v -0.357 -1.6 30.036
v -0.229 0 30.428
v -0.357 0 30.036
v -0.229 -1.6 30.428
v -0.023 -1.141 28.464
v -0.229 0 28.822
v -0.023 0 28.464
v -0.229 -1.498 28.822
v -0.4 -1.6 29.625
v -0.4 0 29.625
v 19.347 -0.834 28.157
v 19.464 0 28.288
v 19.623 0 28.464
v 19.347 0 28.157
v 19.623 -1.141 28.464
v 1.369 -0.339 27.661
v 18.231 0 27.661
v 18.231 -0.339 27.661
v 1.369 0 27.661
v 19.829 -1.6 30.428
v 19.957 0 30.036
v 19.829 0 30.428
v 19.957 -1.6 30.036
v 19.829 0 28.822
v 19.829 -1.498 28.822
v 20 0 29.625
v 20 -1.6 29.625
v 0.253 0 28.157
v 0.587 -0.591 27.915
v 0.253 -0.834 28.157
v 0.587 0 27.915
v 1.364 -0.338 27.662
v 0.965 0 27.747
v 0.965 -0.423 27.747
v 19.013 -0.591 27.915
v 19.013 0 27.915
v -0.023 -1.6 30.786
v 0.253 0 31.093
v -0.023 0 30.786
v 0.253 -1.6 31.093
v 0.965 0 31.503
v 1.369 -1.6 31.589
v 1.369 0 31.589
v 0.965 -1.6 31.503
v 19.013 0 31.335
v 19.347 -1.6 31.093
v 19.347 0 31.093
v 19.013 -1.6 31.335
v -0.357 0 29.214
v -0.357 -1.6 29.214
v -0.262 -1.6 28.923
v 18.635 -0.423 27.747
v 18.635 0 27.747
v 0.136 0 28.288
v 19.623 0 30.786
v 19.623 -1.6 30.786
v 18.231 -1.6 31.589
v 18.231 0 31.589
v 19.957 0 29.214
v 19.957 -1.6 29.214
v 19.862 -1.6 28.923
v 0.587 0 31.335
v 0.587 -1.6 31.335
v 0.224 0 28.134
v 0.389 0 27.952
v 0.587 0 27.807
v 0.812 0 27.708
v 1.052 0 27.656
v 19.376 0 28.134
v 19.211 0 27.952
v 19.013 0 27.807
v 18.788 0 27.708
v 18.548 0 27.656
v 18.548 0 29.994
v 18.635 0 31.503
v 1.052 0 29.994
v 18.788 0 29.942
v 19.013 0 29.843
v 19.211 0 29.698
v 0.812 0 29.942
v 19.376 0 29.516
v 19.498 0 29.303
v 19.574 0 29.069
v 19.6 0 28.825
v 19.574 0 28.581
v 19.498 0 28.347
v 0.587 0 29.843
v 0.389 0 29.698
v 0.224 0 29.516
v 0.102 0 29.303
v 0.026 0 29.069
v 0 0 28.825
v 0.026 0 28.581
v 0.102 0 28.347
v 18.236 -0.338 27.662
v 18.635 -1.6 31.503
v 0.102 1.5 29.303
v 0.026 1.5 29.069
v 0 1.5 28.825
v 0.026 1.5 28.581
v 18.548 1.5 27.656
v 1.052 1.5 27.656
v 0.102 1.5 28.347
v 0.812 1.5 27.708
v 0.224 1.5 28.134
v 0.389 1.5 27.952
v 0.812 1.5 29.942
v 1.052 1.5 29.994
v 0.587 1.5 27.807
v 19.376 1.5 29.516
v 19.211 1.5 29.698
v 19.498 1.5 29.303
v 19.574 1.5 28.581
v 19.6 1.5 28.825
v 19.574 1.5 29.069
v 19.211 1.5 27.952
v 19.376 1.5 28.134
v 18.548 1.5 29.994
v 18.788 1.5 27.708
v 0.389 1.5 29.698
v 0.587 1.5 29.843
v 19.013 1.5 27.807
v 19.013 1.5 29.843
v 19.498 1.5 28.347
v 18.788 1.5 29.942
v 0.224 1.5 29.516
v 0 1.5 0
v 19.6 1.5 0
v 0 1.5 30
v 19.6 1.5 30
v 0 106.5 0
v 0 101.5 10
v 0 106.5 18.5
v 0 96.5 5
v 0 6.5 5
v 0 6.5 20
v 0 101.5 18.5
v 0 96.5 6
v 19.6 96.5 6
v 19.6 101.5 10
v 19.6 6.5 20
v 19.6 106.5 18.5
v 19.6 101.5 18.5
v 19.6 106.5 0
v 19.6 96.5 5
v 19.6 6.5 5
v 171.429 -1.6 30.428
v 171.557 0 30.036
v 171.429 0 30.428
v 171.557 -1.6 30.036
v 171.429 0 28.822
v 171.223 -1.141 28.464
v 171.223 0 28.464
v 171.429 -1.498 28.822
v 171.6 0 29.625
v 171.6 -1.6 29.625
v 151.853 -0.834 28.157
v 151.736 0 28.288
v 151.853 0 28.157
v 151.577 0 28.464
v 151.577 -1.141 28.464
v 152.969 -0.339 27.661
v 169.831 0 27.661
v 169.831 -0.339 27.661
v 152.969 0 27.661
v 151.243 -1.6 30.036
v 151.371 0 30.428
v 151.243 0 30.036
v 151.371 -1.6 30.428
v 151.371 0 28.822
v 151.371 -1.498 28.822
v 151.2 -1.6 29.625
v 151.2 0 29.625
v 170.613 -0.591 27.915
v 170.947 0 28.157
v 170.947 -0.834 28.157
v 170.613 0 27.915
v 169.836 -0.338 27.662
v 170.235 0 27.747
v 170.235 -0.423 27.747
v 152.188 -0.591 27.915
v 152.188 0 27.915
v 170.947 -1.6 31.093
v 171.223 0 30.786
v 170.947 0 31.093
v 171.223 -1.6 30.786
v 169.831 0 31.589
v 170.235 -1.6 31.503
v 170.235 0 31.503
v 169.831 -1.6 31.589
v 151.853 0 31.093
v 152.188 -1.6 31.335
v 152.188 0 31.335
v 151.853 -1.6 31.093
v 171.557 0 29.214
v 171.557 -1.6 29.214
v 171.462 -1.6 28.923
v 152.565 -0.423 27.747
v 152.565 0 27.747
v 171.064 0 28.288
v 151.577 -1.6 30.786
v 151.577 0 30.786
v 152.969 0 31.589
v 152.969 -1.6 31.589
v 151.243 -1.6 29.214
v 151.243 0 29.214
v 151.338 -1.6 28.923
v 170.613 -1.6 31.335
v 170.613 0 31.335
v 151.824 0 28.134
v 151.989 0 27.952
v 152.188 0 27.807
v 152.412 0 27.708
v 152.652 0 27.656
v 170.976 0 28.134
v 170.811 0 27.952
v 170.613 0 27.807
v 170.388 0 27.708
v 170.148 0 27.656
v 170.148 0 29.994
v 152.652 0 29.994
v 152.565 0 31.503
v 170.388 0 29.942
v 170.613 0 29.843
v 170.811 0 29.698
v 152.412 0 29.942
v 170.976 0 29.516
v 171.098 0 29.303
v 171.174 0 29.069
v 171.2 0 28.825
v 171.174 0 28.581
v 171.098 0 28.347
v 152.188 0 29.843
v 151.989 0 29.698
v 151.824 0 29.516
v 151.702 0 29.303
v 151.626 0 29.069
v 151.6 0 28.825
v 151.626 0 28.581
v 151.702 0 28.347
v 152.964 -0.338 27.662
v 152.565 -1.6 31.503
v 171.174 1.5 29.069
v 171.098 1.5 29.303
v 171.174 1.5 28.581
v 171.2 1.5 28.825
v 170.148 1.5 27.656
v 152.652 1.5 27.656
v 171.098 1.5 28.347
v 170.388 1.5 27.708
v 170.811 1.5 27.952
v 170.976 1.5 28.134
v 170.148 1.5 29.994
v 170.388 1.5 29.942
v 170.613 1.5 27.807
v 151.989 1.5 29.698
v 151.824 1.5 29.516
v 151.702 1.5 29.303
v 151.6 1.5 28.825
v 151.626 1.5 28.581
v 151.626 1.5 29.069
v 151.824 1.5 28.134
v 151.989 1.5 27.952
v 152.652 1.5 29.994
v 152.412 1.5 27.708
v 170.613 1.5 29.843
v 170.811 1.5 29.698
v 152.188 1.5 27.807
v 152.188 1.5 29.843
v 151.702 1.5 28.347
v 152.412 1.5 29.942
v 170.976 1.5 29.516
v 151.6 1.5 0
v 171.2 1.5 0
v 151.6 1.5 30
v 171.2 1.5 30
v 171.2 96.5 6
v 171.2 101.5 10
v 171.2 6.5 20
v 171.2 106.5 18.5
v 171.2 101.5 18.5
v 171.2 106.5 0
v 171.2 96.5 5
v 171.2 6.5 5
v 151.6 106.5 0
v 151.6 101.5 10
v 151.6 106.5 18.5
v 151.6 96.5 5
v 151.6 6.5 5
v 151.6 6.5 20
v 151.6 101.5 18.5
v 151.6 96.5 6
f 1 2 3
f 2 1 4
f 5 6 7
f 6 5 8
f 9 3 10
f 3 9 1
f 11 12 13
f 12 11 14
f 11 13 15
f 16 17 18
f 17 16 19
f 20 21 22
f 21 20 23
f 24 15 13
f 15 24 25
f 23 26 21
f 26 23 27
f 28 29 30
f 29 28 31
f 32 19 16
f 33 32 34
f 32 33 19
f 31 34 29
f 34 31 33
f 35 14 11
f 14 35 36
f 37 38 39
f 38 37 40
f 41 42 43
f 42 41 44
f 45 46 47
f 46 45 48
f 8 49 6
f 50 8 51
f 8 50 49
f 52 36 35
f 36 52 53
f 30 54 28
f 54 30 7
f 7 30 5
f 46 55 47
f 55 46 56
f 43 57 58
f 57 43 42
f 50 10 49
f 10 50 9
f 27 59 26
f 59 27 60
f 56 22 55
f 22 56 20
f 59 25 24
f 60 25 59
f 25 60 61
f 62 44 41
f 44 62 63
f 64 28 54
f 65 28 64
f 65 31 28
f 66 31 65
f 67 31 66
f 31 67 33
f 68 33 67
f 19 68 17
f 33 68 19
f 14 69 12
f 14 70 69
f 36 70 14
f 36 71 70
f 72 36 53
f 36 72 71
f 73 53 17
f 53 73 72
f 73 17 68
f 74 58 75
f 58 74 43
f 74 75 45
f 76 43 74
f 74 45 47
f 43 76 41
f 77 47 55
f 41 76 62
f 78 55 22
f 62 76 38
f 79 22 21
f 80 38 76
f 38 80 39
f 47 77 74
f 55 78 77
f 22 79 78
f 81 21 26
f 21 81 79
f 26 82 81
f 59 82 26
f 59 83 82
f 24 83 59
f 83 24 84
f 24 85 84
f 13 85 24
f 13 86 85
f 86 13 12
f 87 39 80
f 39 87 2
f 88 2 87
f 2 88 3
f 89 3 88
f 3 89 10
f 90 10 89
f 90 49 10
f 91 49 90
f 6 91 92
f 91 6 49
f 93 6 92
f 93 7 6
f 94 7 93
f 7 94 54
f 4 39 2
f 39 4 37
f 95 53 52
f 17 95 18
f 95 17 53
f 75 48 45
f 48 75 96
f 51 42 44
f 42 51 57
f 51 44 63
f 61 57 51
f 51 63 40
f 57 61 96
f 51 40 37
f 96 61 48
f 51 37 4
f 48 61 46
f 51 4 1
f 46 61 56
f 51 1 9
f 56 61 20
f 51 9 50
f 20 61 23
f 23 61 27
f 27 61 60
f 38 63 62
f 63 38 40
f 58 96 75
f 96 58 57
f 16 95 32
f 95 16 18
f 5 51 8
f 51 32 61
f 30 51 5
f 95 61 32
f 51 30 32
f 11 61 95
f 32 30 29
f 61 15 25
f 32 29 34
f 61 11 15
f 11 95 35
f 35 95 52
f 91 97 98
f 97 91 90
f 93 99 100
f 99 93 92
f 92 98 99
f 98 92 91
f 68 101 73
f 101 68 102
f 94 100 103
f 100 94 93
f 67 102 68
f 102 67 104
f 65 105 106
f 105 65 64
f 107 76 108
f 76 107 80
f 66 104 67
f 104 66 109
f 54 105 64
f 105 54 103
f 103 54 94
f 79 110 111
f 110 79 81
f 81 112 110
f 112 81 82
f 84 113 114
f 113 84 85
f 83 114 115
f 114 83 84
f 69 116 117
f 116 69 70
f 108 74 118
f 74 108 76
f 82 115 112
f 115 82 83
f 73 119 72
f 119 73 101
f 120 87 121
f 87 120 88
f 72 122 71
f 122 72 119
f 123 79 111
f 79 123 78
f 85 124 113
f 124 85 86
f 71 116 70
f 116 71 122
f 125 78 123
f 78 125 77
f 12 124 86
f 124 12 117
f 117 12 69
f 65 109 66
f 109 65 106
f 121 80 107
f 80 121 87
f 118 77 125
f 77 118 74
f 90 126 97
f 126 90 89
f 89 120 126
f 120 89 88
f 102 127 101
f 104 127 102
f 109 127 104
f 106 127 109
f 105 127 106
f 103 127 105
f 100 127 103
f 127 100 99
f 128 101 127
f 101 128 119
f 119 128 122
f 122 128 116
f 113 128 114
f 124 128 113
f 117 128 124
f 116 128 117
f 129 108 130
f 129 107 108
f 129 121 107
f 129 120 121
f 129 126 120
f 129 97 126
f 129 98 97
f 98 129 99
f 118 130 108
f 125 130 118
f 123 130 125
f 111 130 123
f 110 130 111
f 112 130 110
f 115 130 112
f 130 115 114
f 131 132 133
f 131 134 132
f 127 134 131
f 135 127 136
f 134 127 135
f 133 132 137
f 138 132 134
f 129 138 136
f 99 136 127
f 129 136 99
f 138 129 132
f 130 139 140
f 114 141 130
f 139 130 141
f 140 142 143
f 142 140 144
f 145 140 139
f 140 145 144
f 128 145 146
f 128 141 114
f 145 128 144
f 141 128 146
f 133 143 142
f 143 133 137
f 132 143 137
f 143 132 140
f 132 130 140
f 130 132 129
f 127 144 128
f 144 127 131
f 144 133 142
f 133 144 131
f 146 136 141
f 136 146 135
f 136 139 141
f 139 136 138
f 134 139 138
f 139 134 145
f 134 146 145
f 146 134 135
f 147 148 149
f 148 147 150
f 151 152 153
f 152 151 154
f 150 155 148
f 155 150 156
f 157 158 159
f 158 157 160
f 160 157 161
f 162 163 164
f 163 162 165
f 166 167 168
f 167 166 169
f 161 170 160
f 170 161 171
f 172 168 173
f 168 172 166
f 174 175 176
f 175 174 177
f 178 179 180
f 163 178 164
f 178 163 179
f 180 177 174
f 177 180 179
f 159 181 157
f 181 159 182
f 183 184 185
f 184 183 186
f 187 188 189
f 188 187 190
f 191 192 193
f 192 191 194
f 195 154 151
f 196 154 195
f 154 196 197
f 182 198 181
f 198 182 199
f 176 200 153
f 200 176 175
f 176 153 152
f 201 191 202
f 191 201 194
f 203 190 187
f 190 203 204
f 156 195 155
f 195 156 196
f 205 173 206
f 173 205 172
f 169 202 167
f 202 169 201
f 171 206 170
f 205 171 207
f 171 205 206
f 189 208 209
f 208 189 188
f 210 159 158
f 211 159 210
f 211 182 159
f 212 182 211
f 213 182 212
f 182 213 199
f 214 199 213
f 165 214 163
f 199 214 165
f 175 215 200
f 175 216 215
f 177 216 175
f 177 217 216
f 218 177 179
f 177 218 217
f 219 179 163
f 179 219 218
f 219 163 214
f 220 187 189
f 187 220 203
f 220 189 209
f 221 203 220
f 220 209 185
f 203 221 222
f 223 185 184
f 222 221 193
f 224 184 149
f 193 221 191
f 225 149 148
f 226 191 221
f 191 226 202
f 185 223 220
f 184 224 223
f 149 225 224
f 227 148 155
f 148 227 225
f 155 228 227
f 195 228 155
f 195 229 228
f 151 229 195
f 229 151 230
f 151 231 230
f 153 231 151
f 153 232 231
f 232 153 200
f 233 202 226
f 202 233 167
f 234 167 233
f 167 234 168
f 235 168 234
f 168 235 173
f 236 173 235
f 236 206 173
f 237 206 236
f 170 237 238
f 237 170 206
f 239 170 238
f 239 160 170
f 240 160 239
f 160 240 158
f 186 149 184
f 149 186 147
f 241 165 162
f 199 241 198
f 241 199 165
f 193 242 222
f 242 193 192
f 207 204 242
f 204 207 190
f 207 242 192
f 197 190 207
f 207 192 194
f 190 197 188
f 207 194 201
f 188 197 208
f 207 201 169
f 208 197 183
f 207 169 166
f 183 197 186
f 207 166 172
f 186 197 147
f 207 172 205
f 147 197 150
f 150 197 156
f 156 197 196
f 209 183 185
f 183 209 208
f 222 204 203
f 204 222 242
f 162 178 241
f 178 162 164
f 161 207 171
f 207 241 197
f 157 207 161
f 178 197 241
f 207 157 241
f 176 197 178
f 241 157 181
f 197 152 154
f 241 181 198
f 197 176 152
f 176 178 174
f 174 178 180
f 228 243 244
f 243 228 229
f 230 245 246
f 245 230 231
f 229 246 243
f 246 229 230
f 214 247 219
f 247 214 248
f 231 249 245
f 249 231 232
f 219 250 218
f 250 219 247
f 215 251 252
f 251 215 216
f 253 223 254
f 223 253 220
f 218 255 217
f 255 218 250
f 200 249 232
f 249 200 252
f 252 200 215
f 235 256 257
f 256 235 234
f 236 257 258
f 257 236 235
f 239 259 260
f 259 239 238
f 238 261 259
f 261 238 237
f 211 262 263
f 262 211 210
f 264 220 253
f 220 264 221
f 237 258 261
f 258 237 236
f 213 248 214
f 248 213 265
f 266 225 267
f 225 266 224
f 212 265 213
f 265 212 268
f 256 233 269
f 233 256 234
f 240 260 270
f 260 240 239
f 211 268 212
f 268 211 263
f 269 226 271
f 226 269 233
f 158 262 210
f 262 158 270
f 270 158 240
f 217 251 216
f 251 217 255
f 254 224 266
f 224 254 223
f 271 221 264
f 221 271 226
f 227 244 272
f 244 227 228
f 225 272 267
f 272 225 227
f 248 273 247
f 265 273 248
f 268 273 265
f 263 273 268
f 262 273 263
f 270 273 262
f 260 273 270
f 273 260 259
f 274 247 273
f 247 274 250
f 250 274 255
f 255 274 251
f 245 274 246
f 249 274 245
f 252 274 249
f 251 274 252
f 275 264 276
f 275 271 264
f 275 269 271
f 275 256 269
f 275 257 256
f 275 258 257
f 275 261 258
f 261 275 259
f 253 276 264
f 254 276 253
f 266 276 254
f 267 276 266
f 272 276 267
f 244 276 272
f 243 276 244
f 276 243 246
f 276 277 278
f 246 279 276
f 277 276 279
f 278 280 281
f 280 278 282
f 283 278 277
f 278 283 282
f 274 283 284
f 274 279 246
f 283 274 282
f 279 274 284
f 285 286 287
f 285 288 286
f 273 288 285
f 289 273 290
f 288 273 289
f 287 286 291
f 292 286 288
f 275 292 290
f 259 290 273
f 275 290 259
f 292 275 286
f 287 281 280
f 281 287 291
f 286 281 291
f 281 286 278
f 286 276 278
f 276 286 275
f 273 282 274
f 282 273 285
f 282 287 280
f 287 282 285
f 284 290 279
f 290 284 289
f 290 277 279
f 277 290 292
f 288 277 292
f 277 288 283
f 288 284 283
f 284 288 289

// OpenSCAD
// Rack Display Mount - Shelf Brackets
// Two supports clip into vertical vented faceplate,
// extend back into rack to hold display face-up
//
// Faceplate is in XZ plane at Y=0 (front face at Y=0, back at Y=panel_t)
// Rack interior extends in +Y direction
// Tabs pass through slots; bracket body is behind panel

/* [Display] */
display_w = 132;    // width (X, along faceplate)
display_d = 86;    // depth (Y, into rack)
display_h = 8.5;     // thickness (Z)

/* [Faceplate Slots] */
slot_w = 20;            // slot width (pill shape, horizontal)
slot_h = 2.75;          // slot height (vertical)
panel_t = 1.5;          // panel thickness (Y)
gap_x = 6.4;            // horizontal gap between slots
gap_y = 3.45;           // vertical gap between slots

/* [Bracket Parameters] */
wall = 5;             // wall thickness
shelf_depth = 105;      // shelf extends into rack (Y)
lip = 2.5;              // lip height to retain display
rise = 20;              // raise back end to angle the display
clearance = 0.2;        // clearance per side for tabs
num_tab_rows = 1;       // slot rows to engage (Z direction)
tab_barb = 0.4;         // barb overhang on front face for retention

/* [Derived] */
pitch_z = slot_h + gap_y;  // 6.2mm vertical pitch on faceplate
tab_w = slot_w - clearance * 2;
tab_h = slot_h - clearance * 2;

// Bracket body spans from top tab to bottom tab + walls
body_height = (num_tab_rows - 1) * pitch_z + slot_h + wall * 2;

$fn = 30;

module pill_2d(w, h) {
    r = h / 2;
    hull() {
        translate([r, r]) circle(r=r);
        translate([w - r, r]) circle(r=r);
    }
}

// Tab: thin pill that passes through slot (Y axis)
// Origin at front face of panel, centered on slot
module tab() {
    // Front barb (sits against front face of panel, wider than slot)
    difference() {
      translate([-(tab_barb), -1.6, (tab_barb*4)])
          rotate([-90, 0, 0])
              linear_extrude(1.6)
                  pill_2d(tab_w + tab_barb * 2, tab_h + tab_barb * 4);
      translate([-(tab_w/2), -2, -4])
        rotate([45, 0, 0])
          cube([tab_w*2, tab_h, 2]);
    }

    // Through-slot portion
    rotate([-90, 0, 0])
        linear_extrude(panel_t)
            pill_2d(tab_w, tab_h);
}

module bracket() {
    spine_height = rise + wall + wall;

    // Side profile as a single polygon (depth x height), extruded along X
    // rotate(120, [1,1,1]) maps: polygon X→world Y, polygon Y→world Z, extrusion Z→world X
    outer = [
        [0, 0],                                        // bottom front
        [shelf_depth, 0],                              // bottom rear
        [shelf_depth, wall + display_h + wall],        // top rear lip outer
        [shelf_depth - wall, wall + display_h + wall], // top rear lip inner
        [shelf_depth - wall, wall + wall],             // shelf surface at rear
        [0, spine_height],                             // shelf surface / spine top at front
    ];
    hole = [
        [wall, wall],                    // hole bottom front
        [shelf_depth - wall * 2, wall],  // hole bottom rear
        [shelf_depth - wall * 2, wall + 1], // hole top rear
        [wall, rise],                    // hole top front
    ];
    translate([0, panel_t, 0])
    rotate(120, [1, 1, 1])
    linear_extrude(tab_w)
    polygon(
        points = concat(outer, hole),
        paths = [[0,1,2,3,4,5], [6,7,8,9]]
    );

    translate([0, 0, spine_height])
        tab();
}

// --- Layout ---

// Left bracket
bracket();

// Right bracket (mirrored)
translate([display_w + tab_w * 2, 0, 0])
    mirror([1, 0, 0])
        bracket();

// Reference display (transparent, remove for printing)
shelf_angle = atan2(rise, shelf_depth);
%translate([tab_w, panel_t + wall, wall + wall + rise])
    rotate([shelf_angle, 0, 0])
        cube([display_w, display_d, display_h]);
